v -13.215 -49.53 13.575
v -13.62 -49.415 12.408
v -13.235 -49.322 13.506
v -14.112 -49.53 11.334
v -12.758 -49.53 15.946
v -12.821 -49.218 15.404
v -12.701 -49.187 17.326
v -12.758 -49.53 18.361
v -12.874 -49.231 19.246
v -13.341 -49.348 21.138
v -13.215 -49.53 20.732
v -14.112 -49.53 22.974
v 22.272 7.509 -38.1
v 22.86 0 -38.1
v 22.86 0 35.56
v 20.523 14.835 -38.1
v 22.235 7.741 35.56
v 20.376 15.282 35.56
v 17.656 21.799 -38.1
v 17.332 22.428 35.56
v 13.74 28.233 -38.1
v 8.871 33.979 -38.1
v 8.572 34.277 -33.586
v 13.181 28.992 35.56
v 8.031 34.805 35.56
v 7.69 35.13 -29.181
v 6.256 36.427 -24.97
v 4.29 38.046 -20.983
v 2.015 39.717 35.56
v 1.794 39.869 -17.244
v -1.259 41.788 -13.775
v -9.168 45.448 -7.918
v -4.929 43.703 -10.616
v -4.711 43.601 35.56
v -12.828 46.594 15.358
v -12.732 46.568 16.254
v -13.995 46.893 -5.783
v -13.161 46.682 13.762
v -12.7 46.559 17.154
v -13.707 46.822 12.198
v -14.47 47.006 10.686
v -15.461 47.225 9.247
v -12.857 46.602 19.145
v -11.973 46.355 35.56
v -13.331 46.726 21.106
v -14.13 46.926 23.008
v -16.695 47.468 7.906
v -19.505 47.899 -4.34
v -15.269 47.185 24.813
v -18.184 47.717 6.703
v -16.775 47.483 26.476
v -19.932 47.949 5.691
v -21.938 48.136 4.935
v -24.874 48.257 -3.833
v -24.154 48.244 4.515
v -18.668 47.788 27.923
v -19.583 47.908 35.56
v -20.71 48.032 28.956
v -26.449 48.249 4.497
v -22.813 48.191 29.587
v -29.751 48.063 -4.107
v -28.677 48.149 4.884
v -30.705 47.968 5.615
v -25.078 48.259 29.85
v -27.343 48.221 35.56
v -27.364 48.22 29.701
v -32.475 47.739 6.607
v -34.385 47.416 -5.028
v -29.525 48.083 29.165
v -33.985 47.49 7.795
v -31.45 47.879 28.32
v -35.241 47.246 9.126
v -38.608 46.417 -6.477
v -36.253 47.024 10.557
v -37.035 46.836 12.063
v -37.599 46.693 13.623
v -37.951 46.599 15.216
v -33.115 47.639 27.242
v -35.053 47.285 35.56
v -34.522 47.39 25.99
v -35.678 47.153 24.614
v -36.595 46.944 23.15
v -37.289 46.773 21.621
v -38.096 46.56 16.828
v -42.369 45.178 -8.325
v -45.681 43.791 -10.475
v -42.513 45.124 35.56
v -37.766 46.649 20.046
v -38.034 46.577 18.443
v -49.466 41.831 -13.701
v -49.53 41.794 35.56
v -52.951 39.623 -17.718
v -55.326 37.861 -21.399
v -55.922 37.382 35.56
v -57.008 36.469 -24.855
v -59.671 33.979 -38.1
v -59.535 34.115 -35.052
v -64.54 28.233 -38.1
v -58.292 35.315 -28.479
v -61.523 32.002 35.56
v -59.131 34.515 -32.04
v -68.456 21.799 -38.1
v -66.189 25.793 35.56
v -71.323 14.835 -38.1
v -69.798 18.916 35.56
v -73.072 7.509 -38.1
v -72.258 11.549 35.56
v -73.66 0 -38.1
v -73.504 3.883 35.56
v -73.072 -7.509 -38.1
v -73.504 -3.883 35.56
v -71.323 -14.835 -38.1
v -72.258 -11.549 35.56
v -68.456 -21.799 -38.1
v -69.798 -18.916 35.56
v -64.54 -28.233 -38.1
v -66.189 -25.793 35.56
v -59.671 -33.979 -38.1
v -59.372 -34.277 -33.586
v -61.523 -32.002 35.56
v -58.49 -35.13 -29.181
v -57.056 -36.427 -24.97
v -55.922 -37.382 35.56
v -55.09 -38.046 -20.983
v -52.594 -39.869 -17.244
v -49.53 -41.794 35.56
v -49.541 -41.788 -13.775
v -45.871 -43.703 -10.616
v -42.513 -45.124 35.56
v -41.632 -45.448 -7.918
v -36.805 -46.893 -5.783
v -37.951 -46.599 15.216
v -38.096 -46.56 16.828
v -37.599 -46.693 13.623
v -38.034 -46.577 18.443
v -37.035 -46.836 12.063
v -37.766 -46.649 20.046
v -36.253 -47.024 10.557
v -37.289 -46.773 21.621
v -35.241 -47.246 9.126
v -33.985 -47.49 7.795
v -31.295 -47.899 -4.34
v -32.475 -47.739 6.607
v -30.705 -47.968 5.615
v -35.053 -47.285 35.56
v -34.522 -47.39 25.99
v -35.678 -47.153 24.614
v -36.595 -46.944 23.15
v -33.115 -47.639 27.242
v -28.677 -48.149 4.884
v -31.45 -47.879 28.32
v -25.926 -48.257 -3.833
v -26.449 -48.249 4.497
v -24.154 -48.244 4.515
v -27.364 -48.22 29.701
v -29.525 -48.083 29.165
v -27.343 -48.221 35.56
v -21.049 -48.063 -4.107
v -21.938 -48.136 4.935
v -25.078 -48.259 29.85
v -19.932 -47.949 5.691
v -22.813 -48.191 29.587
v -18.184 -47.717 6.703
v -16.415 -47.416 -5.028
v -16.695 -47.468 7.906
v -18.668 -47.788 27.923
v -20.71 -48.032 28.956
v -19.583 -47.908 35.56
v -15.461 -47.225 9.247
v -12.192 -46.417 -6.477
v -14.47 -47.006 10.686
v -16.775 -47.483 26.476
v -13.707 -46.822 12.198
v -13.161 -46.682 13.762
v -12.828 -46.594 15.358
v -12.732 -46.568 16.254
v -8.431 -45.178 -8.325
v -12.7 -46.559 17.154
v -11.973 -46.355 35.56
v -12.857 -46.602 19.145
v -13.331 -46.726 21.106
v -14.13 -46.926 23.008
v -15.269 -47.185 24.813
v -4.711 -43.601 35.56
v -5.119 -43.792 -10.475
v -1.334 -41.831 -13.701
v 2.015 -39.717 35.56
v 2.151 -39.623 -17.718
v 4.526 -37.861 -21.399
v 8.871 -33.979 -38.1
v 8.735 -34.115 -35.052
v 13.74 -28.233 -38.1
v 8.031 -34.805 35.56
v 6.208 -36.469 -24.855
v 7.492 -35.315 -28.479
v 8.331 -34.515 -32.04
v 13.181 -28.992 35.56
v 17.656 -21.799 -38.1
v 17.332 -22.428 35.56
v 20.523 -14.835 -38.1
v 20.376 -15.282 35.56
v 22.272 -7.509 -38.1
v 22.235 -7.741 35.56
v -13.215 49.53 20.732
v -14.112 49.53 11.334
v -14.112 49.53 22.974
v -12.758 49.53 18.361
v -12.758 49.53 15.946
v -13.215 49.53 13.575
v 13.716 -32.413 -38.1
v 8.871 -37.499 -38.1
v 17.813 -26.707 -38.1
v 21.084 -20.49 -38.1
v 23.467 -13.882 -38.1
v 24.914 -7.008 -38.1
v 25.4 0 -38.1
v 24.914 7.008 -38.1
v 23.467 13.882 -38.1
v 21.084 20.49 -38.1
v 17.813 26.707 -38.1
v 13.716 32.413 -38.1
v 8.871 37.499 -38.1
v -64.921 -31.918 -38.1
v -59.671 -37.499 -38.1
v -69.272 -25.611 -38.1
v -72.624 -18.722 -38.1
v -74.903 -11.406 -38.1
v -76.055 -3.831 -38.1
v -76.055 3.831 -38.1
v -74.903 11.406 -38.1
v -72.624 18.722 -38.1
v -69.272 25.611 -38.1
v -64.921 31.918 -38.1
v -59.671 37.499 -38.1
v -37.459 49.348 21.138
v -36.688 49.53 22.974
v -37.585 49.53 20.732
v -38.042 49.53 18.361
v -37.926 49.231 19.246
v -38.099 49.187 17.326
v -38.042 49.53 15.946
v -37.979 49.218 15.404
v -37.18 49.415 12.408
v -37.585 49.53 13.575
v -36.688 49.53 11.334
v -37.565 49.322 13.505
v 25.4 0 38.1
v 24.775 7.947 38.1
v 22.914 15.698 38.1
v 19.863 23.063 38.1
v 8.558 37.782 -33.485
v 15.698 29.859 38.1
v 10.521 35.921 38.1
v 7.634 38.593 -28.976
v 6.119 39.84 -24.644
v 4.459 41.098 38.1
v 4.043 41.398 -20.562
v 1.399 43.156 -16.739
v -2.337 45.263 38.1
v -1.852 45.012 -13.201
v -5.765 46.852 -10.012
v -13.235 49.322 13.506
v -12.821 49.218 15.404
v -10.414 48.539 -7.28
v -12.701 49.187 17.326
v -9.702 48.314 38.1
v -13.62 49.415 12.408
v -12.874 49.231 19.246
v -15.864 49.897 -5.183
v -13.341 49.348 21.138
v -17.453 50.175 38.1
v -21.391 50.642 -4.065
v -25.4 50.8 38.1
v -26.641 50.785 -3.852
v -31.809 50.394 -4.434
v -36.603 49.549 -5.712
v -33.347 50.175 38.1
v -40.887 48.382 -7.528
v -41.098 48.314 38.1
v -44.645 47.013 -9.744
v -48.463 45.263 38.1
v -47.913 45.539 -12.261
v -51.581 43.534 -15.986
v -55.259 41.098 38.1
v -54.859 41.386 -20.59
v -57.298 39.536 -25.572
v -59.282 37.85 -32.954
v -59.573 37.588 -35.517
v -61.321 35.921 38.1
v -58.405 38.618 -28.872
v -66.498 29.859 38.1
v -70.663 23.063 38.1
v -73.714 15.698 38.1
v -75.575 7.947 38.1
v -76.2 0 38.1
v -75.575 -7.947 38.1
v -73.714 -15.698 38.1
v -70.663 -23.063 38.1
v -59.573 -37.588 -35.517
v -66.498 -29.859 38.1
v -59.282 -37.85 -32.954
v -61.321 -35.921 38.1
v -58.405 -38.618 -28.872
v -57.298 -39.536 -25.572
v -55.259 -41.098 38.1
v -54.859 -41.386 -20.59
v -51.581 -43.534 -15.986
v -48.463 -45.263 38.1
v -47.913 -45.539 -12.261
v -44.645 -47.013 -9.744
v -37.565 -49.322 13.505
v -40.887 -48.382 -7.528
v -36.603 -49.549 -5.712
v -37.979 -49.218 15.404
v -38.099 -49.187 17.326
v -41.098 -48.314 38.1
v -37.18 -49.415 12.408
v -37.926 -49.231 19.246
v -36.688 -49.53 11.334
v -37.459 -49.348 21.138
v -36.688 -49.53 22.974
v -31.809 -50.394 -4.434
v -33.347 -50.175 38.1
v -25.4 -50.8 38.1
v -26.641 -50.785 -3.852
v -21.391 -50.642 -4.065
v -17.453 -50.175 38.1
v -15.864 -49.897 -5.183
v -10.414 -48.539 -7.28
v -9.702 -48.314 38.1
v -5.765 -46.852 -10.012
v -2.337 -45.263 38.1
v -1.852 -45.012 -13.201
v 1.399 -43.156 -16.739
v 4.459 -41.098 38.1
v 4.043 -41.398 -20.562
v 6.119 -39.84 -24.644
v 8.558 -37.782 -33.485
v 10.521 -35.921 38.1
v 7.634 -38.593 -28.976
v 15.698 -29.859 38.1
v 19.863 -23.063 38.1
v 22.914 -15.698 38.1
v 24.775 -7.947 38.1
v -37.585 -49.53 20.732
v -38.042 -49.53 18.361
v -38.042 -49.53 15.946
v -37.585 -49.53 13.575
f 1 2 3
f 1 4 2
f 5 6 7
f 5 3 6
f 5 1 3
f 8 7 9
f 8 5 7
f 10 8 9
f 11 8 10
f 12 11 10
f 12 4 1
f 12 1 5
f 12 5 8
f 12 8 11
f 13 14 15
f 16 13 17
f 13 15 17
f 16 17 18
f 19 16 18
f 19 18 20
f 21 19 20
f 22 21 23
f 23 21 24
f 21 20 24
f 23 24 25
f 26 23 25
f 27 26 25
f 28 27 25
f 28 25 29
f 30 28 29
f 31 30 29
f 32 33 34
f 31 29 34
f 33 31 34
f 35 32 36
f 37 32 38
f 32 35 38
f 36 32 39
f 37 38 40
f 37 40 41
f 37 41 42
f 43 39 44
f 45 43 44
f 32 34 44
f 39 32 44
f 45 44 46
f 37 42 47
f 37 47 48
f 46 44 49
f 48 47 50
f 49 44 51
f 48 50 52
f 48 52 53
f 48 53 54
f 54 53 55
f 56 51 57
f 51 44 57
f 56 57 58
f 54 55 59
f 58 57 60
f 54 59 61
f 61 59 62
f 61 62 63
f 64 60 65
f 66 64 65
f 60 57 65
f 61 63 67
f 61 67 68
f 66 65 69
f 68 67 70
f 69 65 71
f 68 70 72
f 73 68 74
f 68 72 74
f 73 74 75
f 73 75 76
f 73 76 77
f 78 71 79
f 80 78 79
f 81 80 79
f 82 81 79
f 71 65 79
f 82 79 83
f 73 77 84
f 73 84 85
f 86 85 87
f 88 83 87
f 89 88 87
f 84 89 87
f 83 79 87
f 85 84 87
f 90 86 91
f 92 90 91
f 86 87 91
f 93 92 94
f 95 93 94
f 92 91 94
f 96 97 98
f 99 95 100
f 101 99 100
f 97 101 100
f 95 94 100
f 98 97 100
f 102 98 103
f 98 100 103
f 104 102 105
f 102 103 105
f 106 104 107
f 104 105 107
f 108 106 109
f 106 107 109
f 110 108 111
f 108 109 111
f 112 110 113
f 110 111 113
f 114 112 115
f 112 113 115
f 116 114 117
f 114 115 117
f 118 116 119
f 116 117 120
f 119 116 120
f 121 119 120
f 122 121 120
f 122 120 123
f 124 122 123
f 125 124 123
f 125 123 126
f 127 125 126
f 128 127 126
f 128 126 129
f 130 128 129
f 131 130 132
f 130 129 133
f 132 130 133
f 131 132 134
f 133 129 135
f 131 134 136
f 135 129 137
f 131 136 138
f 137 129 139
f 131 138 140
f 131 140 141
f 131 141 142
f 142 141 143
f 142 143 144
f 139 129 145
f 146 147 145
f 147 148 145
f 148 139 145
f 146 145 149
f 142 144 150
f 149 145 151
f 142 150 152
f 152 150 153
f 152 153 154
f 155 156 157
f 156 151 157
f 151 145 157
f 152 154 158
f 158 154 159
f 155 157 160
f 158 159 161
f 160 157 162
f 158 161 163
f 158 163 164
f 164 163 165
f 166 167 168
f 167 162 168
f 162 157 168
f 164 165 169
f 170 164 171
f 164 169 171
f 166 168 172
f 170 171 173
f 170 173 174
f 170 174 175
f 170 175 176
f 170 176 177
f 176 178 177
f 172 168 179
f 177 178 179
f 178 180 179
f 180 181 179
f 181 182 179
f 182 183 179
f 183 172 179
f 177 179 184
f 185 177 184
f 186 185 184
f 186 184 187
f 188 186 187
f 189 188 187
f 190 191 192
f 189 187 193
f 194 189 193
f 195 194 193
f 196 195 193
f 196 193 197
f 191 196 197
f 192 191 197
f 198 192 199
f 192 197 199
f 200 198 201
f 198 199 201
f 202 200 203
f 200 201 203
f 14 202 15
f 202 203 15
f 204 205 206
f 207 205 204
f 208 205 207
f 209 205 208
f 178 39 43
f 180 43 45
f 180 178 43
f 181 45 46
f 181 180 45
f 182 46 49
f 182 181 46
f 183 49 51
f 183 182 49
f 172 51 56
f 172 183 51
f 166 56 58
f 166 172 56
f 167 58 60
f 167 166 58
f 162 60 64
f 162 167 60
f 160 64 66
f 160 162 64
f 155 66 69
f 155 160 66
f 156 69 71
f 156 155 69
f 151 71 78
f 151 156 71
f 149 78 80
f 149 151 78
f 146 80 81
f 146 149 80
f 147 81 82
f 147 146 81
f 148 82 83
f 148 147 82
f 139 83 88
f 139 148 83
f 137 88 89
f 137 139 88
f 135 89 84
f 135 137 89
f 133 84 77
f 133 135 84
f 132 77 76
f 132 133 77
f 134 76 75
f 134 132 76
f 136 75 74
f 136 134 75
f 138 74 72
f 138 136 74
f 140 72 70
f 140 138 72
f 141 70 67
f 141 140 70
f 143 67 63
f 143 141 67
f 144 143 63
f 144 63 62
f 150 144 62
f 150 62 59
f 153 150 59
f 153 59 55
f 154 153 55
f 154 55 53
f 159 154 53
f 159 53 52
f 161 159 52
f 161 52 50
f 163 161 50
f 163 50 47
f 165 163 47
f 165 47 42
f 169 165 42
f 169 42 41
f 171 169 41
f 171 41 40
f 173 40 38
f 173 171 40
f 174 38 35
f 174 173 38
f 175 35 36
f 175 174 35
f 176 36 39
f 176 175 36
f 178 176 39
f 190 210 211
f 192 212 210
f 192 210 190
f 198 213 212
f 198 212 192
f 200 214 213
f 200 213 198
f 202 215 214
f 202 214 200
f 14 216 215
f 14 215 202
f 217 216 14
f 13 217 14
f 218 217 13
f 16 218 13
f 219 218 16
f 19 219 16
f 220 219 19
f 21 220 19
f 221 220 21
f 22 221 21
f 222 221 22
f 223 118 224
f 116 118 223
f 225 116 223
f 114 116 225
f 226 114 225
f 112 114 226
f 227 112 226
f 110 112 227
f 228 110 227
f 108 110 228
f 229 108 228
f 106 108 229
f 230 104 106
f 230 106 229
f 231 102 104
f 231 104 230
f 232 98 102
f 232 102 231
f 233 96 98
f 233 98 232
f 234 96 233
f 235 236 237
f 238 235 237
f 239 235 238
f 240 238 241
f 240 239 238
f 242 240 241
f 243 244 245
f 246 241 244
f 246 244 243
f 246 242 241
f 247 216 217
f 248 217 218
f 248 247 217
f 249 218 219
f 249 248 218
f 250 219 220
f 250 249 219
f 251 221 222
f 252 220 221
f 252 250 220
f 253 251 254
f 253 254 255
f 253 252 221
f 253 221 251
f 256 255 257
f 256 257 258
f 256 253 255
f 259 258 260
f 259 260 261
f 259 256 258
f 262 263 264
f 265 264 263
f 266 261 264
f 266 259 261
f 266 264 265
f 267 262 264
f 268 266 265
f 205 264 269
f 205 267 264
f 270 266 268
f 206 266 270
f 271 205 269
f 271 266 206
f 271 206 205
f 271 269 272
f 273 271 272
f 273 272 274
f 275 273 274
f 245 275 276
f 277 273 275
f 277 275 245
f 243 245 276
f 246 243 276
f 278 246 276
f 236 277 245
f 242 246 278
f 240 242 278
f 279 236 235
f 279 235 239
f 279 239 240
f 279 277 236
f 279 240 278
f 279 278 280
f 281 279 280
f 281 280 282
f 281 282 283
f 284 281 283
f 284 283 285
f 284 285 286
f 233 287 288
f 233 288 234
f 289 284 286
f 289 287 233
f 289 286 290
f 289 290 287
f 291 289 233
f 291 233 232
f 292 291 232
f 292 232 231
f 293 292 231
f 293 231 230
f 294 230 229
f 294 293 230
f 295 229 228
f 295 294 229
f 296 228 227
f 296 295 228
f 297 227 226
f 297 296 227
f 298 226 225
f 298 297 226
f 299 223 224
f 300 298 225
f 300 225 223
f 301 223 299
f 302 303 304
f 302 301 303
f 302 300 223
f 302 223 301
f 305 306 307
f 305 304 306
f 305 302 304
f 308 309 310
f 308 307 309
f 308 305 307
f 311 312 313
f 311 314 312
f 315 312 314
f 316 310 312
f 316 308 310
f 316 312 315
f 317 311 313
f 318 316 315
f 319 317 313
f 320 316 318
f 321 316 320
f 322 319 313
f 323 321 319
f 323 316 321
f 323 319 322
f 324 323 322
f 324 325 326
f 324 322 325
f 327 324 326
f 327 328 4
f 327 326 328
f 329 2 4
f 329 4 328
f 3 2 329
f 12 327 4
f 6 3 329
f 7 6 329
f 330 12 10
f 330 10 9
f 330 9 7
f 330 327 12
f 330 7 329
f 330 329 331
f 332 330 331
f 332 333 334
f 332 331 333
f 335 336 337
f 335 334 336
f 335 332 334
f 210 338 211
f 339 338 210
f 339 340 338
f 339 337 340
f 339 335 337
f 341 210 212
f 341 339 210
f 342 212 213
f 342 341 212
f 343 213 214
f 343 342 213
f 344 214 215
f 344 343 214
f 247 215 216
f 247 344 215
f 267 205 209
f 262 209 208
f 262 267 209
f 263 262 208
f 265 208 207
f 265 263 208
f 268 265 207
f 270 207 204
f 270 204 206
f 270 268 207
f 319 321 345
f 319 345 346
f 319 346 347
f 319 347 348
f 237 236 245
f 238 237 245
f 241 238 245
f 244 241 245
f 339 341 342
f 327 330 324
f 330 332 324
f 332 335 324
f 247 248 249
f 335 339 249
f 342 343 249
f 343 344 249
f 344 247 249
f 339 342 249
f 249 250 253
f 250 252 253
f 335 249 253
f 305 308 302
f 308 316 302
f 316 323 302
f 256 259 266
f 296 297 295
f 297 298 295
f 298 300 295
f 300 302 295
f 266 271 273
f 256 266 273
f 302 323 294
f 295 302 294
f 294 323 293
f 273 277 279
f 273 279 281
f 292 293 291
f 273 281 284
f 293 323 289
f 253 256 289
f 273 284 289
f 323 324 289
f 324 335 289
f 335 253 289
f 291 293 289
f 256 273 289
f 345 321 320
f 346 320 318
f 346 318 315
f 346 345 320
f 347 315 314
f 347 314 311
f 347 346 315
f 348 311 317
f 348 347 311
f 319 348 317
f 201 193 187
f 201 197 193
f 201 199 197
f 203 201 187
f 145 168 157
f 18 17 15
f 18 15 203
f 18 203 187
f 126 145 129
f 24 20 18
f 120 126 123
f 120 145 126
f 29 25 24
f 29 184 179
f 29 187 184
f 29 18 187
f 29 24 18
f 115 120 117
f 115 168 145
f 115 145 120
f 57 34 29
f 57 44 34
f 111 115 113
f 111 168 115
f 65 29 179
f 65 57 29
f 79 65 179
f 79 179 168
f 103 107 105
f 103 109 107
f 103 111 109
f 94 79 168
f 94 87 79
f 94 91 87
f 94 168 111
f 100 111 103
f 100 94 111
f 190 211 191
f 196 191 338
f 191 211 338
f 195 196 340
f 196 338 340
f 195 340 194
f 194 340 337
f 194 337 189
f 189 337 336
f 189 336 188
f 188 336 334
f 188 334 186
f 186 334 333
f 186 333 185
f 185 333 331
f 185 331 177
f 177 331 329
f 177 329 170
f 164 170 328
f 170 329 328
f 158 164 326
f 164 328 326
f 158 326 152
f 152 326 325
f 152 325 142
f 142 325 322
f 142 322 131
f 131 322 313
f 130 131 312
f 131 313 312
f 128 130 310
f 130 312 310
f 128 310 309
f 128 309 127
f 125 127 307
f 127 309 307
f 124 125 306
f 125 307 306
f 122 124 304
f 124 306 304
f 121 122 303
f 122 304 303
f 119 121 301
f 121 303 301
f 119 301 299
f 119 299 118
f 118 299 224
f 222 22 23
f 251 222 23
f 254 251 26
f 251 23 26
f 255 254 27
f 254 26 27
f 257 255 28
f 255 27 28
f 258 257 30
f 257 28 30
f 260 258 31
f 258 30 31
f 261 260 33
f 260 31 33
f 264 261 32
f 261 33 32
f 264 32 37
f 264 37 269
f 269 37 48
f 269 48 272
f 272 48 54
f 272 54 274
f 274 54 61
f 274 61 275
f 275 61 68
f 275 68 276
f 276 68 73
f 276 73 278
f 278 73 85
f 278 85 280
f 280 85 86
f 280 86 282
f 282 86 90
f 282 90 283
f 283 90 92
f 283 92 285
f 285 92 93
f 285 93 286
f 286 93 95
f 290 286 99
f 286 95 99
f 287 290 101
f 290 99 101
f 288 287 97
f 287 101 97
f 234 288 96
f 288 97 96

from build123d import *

# Parameters (mm, degrees)
F0_W     = 50.8
F0_H     = 76.2
F2_T     = -2.54
F4_DEPTH = 60.96
F5_R     = 12.7
F6_DEPTH = 49.53


with BuildPart() as f1:
    # F0 (on Front) → F1 (revolve)
    with BuildSketch(Plane.XZ):
        Rectangle(F0_W, F0_H)
    revolve(axis=Axis((-25.4, 0, 0), (0, 0, 1)))

    # F2
    f2_openings = [f1.faces().sort_by_distance(p)[0] for p in [
        (-25.4, 0, -38.1),
    ]]
    offset(amount=F2_T, openings=f2_openings)

    # F3 (on Front) → F4 (cut, symmetric)
    with BuildSketch(Plane.XZ):
        with BuildLine():
            ThreePointArc((8.870553, -38.1), (-25.4, -3.829447), (-59.670553, -38.1))
            Line((-59.670553, -38.1), (8.870553, -38.1))
        make_face()
    extrude(amount=F4_DEPTH, both=True, mode=Mode.SUBTRACT)

    # F5 (on Front) → F6 (join, symmetric)
    with BuildSketch(Plane.XZ):
        with Locations((-25.4, 17.153753)):
            Circle(F5_R)
    extrude(amount=F6_DEPTH, both=True)


solid = f1.part
